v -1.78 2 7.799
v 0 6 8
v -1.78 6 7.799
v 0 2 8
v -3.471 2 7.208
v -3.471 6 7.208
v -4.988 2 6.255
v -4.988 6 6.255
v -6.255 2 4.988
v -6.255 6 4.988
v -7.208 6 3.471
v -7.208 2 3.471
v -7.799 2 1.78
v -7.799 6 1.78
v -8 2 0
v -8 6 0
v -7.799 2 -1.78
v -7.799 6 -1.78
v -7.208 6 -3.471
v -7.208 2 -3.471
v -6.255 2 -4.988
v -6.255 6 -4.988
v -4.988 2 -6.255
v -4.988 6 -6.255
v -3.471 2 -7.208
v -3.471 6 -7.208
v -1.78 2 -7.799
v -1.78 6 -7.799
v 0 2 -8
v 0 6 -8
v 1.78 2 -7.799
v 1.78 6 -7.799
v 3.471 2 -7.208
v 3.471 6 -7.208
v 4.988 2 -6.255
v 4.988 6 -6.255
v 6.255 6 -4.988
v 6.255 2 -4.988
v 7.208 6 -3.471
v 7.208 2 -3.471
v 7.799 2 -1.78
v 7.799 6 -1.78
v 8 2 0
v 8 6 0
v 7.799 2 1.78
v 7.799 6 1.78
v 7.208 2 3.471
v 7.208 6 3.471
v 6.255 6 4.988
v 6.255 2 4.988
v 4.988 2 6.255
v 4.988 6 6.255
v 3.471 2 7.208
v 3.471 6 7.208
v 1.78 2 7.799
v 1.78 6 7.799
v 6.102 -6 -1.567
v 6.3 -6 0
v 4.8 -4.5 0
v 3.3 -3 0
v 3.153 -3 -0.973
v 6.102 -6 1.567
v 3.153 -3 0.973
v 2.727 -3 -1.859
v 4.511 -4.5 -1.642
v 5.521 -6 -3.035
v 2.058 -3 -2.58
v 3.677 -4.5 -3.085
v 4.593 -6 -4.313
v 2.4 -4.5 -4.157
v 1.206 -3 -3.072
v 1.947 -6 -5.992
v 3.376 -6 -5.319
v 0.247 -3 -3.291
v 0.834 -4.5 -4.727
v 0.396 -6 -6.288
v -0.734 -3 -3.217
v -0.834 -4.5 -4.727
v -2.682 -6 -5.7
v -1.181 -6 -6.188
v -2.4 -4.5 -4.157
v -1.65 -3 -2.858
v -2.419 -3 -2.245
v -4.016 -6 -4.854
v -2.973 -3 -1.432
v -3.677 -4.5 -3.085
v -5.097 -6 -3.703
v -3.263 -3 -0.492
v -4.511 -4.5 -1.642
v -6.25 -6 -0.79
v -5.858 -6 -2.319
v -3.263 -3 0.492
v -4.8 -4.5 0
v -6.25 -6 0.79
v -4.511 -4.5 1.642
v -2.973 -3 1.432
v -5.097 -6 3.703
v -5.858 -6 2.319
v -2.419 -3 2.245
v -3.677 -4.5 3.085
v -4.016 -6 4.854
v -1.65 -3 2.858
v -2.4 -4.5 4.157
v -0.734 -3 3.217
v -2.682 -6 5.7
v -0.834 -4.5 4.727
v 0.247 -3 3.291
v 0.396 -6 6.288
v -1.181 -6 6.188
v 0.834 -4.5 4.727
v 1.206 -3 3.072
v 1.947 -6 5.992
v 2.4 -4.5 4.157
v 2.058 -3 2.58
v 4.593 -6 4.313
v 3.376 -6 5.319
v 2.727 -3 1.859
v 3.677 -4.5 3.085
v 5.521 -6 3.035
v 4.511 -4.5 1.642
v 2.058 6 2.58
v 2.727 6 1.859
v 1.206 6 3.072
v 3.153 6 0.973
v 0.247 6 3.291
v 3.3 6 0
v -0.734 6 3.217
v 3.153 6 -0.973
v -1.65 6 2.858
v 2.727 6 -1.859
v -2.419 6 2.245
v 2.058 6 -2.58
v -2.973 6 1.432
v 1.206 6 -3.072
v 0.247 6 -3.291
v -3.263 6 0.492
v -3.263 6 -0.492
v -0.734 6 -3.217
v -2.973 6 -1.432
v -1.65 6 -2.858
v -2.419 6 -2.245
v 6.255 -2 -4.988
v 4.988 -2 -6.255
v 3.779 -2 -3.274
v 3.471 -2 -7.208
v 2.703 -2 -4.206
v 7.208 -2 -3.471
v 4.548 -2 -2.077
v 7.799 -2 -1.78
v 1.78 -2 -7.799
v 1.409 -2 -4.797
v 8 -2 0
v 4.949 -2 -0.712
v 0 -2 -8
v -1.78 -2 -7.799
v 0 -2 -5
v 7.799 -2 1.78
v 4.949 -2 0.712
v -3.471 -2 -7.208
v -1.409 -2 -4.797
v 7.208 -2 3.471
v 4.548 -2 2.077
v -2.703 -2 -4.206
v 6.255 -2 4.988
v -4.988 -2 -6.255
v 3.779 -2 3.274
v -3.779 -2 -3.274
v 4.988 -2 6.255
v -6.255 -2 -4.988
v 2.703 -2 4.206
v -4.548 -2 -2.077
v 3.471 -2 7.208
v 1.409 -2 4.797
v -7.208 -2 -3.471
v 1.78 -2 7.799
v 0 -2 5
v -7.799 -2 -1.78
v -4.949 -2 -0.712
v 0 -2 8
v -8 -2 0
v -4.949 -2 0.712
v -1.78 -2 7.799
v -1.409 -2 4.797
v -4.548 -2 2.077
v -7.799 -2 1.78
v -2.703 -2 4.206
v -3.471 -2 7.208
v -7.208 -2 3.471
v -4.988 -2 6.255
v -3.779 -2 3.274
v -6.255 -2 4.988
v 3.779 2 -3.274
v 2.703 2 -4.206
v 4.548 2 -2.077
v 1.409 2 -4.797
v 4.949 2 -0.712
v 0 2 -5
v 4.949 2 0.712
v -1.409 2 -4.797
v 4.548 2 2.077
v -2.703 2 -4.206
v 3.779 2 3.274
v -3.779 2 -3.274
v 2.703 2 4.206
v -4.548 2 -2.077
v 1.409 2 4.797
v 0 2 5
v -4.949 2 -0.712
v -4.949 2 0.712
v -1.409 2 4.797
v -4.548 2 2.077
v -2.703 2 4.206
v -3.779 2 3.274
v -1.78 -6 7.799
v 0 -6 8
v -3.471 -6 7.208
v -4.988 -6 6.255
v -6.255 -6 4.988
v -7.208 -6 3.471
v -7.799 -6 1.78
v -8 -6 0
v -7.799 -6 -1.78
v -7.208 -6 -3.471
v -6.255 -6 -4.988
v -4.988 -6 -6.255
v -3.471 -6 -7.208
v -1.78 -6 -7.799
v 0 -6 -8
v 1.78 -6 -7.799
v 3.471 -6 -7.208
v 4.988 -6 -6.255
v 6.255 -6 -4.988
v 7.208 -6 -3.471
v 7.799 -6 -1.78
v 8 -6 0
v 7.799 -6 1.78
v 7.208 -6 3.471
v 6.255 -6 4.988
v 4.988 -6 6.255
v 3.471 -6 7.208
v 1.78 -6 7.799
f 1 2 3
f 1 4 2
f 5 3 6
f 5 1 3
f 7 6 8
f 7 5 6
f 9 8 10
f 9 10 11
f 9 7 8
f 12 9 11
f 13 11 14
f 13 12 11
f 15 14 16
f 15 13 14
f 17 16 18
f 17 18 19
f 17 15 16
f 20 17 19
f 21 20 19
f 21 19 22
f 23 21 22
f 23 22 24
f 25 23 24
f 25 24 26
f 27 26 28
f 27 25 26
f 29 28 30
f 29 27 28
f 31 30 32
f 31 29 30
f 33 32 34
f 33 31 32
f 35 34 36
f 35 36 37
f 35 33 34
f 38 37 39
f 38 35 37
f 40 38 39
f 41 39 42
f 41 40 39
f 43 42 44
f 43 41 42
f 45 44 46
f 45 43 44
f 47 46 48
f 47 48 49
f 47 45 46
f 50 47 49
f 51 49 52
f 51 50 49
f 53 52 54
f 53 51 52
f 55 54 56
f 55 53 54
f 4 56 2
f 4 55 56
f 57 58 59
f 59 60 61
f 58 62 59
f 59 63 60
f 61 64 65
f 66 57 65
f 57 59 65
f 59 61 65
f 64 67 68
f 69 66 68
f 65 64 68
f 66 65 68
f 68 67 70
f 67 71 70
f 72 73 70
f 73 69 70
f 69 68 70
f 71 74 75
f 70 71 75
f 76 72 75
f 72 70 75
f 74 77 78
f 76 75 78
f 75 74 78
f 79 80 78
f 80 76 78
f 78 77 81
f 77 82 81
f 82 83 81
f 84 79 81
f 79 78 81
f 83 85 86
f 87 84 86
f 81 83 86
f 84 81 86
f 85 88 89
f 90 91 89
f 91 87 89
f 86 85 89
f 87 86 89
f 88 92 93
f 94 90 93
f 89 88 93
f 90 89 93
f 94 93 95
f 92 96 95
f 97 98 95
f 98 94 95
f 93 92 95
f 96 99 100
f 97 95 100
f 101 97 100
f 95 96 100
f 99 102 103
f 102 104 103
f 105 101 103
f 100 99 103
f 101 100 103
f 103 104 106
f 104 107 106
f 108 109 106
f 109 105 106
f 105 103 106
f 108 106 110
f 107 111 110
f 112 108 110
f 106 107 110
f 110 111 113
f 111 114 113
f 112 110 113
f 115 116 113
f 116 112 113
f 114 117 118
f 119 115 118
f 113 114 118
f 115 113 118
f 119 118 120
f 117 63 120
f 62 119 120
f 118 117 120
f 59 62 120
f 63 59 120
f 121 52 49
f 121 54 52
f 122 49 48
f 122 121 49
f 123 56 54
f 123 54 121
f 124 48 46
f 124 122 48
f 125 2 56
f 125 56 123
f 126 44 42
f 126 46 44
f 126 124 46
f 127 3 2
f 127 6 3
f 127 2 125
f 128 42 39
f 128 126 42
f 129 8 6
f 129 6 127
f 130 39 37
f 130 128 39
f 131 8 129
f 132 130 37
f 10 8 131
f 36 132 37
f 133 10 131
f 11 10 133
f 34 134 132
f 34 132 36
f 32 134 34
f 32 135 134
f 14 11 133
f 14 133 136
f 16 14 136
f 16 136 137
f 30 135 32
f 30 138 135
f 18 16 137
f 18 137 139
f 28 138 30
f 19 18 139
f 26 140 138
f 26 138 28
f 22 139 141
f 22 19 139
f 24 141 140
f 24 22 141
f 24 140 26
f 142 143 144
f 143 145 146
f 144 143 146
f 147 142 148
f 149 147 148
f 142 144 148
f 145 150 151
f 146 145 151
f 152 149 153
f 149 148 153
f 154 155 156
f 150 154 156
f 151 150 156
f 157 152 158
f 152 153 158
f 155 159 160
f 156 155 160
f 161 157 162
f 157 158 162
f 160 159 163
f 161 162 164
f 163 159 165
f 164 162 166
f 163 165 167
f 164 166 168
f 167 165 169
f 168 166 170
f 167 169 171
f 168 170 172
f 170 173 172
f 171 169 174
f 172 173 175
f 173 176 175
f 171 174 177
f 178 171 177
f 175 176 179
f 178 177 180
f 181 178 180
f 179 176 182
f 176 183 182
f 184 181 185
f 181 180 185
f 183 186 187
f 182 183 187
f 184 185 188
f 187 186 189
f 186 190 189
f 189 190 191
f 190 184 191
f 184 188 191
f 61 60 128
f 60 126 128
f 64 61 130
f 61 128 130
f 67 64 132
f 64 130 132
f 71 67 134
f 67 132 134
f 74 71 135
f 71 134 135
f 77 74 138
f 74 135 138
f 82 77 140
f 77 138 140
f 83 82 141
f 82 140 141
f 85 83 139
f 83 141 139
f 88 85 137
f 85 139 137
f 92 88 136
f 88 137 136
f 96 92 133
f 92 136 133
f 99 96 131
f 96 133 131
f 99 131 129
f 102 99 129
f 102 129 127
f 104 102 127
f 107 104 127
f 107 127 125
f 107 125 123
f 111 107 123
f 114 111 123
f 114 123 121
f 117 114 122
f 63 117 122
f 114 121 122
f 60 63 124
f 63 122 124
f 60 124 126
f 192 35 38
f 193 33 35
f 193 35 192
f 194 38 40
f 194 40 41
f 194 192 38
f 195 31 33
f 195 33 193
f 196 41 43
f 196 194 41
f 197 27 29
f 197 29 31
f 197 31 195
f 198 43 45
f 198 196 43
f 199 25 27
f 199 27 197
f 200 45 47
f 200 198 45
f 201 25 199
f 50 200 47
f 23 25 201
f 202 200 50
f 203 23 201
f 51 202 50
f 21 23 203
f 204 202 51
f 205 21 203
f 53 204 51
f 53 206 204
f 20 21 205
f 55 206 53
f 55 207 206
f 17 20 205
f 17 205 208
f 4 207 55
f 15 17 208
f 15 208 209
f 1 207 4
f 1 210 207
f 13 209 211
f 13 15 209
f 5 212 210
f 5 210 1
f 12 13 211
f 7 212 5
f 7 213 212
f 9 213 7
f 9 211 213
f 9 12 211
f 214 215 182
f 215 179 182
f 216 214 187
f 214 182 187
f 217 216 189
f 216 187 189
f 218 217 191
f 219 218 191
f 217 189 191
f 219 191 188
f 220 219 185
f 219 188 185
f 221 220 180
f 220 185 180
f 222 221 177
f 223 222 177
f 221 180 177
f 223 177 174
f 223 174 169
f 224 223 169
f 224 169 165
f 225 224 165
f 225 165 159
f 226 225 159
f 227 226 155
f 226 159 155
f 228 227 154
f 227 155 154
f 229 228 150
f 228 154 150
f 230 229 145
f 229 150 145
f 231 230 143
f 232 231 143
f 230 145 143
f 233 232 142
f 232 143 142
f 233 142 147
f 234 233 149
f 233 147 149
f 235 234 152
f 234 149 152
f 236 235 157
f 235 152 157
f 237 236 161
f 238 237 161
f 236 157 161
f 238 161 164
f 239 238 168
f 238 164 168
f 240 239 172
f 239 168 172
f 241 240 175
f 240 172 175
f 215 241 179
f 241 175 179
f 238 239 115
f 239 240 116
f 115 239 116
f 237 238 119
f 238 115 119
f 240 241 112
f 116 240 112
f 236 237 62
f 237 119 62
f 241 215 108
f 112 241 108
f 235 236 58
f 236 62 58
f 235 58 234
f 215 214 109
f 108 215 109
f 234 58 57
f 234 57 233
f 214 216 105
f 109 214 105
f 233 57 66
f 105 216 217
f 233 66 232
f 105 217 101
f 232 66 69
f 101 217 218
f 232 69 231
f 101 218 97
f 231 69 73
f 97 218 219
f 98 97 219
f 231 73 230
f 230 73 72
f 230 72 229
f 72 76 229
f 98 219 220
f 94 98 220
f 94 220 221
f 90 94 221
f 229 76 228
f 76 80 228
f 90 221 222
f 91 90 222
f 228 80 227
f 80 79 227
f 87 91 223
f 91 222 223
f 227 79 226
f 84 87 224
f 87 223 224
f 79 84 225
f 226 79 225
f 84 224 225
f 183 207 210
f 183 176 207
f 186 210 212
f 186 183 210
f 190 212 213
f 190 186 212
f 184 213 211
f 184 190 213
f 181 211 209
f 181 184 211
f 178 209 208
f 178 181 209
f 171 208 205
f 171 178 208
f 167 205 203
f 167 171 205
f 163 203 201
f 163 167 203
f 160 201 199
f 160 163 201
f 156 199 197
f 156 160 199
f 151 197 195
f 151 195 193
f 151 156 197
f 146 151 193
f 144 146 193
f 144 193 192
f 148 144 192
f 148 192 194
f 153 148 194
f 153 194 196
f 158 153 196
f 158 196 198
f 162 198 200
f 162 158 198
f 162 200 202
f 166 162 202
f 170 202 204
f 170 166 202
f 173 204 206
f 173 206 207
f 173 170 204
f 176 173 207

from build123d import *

# Parameters (mm, degrees)
CSK_FOR_M6_FLAT_HEAD_MACHINE_SCREW1_D           = 6.6
CSK_FOR_M6_FLAT_HEAD_MACHINE_SCREW1_CSINK_D     = 12.6
CSK_FOR_M6_FLAT_HEAD_MACHINE_SCREW1_CSINK_ANGLE = 90


with BuildPart() as part:
    # Sketch1 → Revolve1 (revolve)
    with BuildSketch(Plane.XY, mode=Mode.PRIVATE) as revolve1_sk:
        Polygon((0, 0), (0, -6), (-8, -6), (-8, -2), (-5, -2), (-5, 0), align=None)
    revolve(revolve1_sk.sketch.rotate(Axis((0, 0, 0), (0, -1, 0)), 270), axis=Axis((0, 0, 0), (0, -1, 0)))

    # Mirror1: part across plane


with BuildPart() as part_1:
    add(part.part)
    add(part.part.mirror(Plane(origin=(-5, 0, 0), x_dir=(0, 0, 1), z_dir=(0, 1, 0))))

    # CSK for M6 Flat Head Machine Screw1 (through all)
    with Locations(Plane(origin=(0, -6, 0), x_dir=(-1, 0, 0), z_dir=(0, -1, 0))):
        with Locations((0, 0)):
            CounterSinkHole(CSK_FOR_M6_FLAT_HEAD_MACHINE_SCREW1_D / 2, CSK_FOR_M6_FLAT_HEAD_MACHINE_SCREW1_CSINK_D / 2, counter_sink_angle=CSK_FOR_M6_FLAT_HEAD_MACHINE_SCREW1_CSINK_ANGLE)


solid = part_1.part
